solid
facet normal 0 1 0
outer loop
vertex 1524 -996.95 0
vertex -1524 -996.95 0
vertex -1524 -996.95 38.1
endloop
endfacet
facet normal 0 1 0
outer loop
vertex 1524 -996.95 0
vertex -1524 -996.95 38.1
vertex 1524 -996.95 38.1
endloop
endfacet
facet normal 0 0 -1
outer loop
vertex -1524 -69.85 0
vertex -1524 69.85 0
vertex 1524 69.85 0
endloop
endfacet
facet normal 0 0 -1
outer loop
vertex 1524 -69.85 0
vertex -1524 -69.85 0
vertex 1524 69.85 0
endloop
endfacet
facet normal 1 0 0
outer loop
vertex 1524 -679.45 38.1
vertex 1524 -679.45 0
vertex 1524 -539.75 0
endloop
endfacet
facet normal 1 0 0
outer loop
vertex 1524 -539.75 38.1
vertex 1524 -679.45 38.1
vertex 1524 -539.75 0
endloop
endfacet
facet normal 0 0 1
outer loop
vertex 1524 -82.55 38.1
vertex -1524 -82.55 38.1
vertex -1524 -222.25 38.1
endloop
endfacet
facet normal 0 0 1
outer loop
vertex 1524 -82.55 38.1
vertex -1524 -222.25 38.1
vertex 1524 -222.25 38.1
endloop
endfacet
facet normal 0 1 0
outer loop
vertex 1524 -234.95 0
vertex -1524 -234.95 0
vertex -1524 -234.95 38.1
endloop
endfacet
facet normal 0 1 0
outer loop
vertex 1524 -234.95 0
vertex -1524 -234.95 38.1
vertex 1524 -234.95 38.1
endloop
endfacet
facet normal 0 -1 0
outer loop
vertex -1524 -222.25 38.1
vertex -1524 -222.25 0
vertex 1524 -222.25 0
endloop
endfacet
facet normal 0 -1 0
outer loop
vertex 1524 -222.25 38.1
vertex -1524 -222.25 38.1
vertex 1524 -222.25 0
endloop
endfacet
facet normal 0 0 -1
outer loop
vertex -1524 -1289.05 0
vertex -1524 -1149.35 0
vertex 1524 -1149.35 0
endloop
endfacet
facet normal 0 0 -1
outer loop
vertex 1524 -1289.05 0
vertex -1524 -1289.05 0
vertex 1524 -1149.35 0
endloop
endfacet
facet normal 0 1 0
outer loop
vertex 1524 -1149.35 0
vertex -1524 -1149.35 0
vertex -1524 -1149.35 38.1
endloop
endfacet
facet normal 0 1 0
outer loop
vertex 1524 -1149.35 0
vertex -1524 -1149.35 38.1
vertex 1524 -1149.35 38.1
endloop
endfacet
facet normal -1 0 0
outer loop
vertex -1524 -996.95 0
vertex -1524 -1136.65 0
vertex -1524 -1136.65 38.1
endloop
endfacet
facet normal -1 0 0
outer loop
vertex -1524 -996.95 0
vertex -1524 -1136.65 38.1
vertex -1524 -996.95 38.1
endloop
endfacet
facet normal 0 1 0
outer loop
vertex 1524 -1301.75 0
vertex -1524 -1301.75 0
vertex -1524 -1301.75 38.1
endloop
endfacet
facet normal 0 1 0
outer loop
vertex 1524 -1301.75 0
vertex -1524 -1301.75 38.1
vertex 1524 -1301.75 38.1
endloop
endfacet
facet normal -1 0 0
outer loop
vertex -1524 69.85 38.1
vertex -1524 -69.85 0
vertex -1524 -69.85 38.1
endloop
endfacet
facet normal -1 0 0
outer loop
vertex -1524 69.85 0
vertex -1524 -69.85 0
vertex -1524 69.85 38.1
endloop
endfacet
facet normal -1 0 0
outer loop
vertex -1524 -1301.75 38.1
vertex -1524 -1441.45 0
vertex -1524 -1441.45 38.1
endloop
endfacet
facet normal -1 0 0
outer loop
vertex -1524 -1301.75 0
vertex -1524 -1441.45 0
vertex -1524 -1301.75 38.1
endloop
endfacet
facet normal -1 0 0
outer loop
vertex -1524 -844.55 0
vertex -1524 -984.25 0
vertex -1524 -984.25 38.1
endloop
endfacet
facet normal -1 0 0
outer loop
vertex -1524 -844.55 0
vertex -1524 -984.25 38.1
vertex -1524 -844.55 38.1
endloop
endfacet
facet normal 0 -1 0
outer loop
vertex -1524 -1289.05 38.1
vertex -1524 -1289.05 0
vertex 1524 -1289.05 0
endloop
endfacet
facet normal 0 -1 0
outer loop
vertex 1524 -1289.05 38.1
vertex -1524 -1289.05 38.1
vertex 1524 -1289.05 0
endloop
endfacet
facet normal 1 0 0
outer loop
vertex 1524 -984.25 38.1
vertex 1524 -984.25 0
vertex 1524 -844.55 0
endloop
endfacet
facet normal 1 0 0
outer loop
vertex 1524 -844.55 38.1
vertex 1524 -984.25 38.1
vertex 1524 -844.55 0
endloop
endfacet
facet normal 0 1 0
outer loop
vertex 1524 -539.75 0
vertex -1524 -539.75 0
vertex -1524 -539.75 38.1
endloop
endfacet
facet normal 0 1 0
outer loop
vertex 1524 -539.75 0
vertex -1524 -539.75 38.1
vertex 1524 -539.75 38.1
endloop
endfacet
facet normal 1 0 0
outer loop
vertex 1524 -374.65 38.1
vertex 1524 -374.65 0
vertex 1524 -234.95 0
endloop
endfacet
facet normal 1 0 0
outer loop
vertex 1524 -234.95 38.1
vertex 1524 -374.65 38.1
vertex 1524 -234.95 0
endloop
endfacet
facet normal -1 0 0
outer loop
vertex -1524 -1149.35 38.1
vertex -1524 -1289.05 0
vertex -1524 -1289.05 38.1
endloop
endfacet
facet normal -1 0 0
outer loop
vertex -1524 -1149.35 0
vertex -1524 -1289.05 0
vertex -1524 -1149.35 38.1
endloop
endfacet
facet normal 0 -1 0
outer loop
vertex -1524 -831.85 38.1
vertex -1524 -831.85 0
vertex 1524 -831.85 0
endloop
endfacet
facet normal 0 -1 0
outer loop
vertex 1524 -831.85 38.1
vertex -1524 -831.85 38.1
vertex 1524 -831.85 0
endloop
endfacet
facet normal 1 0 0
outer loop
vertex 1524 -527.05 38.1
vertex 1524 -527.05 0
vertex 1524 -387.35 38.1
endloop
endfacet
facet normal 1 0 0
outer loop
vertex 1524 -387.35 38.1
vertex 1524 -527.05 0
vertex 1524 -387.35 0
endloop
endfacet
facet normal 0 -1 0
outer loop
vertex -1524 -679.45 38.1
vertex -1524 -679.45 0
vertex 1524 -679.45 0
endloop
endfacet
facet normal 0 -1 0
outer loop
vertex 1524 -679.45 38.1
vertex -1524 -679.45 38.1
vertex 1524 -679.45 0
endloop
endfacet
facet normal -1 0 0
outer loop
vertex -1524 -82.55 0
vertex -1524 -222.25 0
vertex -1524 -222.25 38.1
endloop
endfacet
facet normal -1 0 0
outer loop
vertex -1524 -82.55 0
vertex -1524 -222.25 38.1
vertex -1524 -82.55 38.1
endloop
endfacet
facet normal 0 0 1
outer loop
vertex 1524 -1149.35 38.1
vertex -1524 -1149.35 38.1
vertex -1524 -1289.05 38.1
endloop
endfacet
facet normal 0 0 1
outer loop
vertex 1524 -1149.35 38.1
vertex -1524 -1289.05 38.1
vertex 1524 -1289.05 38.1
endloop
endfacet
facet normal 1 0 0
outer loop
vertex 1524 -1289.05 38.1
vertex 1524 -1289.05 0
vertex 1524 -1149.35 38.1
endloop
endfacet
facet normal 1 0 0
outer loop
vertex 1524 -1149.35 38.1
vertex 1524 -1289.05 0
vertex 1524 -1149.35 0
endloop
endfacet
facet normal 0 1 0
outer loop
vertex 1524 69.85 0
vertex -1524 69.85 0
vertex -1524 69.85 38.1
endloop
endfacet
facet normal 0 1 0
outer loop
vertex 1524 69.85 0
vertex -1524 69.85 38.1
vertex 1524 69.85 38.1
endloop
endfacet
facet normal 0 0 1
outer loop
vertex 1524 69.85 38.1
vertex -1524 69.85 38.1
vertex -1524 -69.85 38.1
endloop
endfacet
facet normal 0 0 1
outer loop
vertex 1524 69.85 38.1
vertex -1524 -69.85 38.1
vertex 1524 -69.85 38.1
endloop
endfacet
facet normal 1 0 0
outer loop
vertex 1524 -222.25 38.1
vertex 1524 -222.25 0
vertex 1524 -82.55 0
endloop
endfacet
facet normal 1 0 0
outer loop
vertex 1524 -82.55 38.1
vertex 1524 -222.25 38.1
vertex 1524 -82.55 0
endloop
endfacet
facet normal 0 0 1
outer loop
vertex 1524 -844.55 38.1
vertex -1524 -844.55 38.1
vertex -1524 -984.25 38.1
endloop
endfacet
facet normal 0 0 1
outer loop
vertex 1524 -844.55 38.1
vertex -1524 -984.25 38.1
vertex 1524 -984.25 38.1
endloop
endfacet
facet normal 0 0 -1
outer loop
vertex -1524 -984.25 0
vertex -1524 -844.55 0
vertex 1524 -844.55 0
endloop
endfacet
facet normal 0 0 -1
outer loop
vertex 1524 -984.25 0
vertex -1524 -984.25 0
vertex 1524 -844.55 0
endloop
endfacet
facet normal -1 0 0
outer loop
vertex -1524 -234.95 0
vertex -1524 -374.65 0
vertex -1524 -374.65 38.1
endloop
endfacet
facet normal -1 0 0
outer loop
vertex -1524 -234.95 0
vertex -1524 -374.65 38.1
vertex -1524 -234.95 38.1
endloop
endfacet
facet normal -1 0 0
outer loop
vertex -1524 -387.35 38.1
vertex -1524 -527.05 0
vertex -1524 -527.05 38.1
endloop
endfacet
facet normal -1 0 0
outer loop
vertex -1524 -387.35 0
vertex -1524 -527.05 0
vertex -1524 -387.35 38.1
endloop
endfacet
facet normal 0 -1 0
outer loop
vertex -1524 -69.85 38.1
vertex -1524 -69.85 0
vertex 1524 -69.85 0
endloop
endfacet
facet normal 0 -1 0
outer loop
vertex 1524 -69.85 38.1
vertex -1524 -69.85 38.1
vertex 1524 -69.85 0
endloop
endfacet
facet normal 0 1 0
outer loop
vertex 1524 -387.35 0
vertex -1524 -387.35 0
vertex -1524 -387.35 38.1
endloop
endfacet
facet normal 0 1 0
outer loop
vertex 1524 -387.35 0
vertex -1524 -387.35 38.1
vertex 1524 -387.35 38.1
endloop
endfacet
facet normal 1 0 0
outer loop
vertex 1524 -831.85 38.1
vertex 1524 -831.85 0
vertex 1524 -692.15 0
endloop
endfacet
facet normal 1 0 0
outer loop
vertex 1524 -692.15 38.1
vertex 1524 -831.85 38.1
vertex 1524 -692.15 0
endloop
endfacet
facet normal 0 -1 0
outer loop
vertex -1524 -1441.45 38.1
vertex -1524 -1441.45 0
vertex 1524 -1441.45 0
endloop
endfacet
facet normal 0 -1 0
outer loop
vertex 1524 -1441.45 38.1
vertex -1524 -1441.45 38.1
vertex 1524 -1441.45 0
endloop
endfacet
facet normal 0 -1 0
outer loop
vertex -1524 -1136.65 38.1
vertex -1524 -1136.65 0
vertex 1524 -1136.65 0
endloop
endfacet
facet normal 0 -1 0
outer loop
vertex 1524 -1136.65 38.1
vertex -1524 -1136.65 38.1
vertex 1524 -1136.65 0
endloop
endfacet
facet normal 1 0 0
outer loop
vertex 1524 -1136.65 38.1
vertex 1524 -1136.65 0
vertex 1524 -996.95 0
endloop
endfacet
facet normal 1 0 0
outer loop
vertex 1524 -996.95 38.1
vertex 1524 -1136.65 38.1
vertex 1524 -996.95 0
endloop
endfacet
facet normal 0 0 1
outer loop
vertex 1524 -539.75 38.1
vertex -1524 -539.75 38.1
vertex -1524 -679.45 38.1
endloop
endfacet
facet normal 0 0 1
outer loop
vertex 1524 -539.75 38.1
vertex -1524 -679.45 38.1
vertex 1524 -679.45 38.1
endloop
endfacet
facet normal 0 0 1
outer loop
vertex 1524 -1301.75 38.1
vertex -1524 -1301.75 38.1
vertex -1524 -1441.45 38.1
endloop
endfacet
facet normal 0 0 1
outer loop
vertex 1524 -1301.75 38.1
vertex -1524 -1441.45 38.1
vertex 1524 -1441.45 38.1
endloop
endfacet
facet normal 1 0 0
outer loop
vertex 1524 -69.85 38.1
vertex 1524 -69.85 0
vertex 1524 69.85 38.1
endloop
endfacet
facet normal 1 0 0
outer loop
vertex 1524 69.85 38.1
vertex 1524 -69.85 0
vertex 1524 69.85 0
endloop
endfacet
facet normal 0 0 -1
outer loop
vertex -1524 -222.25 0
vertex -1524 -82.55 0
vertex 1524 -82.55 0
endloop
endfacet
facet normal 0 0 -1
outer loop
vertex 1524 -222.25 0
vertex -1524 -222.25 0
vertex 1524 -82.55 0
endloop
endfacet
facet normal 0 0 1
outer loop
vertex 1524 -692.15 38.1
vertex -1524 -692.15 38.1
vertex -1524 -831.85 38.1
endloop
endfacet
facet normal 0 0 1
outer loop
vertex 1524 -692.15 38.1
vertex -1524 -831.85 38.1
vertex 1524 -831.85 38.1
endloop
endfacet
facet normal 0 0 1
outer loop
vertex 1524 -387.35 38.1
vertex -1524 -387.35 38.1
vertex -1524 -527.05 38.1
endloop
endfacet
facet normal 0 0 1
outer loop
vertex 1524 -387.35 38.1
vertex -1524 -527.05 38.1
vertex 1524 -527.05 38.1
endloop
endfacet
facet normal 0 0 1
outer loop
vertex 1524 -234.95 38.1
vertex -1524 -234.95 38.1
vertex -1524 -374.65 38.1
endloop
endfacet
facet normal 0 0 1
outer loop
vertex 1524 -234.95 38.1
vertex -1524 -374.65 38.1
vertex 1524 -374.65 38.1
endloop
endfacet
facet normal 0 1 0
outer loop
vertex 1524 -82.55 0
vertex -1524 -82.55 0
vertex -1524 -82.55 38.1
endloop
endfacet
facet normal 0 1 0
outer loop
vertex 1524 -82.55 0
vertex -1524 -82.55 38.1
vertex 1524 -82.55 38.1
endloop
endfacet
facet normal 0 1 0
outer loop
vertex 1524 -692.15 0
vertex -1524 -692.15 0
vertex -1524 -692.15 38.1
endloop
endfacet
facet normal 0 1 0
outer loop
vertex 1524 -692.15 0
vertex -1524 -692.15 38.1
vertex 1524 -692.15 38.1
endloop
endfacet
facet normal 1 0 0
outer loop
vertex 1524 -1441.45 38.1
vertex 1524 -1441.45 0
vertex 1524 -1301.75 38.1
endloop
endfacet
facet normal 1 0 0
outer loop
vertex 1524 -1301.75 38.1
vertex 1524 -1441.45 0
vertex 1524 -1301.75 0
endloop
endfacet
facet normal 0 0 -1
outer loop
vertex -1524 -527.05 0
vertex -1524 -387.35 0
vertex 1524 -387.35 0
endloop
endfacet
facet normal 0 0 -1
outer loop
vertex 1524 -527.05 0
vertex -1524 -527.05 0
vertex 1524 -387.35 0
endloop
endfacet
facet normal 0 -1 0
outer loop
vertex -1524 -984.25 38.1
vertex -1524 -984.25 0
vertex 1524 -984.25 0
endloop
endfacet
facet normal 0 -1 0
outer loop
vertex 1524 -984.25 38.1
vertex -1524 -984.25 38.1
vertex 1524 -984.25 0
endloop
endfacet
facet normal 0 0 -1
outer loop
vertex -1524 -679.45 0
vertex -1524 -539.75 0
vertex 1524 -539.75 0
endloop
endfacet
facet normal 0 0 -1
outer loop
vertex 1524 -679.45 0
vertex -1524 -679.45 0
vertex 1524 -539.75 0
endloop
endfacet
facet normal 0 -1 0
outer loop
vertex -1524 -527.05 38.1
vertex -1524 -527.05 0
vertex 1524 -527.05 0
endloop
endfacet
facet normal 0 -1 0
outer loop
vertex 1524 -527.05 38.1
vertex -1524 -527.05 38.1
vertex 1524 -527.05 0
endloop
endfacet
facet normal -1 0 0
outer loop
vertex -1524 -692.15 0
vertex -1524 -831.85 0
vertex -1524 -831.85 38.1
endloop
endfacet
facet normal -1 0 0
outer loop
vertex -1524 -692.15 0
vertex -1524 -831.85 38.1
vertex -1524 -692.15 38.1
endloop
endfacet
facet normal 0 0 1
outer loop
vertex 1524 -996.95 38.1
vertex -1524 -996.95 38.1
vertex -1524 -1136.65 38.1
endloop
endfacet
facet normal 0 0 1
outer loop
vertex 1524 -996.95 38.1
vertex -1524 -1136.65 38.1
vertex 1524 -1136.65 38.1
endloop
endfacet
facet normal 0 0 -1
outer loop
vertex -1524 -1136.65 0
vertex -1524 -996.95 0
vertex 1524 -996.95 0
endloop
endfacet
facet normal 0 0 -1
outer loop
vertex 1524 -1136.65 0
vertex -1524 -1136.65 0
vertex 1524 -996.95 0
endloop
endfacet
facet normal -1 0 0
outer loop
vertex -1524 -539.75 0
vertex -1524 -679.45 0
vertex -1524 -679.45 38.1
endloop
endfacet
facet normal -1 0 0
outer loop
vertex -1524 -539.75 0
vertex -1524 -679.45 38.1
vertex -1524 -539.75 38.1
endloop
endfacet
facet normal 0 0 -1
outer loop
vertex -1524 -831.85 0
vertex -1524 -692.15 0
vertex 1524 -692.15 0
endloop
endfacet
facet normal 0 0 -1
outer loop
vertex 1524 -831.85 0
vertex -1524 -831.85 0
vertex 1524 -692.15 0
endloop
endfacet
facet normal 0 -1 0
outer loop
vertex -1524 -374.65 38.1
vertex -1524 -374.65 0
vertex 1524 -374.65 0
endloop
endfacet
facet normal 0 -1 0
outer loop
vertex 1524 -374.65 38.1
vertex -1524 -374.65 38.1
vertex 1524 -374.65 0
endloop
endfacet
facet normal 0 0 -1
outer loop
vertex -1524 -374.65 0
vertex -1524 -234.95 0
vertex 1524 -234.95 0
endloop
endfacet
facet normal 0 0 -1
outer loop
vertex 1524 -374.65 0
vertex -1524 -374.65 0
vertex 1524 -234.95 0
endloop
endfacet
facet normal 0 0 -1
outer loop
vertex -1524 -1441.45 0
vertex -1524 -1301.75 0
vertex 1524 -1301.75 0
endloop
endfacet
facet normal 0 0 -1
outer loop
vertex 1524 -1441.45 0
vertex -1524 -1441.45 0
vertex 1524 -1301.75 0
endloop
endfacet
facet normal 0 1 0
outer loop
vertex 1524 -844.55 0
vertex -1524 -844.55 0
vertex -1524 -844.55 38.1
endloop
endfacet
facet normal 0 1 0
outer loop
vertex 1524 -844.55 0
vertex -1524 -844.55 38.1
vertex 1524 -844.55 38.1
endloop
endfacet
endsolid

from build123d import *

# Parameters (mm, degrees)
F0_W     = 3048
F0_H     = 139.7
F1_DEPTH = 38.1


with BuildPart() as f1:
    # F0 (on Top) → F1 (new body)
    with BuildSketch(Plane.XY):
        Rectangle(F0_W, F0_H)
        with Locations((0, -152.4)):
            Rectangle(F0_W, F0_H)
        with Locations((0, -304.8)):
            Rectangle(F0_W, F0_H)
        with Locations((0, -457.2)):
            Rectangle(F0_W, F0_H)
        with Locations((0, -609.6)):
            Rectangle(F0_W, F0_H)
        with Locations((0, -762)):
            Rectangle(F0_W, F0_H)
        with Locations((0, -914.4)):
            Rectangle(F0_W, F0_H)
        with Locations((0, -1066.8)):
            Rectangle(F0_W, F0_H)
        with Locations((0, -1219.2)):
            Rectangle(F0_W, F0_H)
        with Locations((0, -1371.6)):
            Rectangle(F0_W, F0_H)
    extrude(amount=F1_DEPTH)


solid = f1.part
